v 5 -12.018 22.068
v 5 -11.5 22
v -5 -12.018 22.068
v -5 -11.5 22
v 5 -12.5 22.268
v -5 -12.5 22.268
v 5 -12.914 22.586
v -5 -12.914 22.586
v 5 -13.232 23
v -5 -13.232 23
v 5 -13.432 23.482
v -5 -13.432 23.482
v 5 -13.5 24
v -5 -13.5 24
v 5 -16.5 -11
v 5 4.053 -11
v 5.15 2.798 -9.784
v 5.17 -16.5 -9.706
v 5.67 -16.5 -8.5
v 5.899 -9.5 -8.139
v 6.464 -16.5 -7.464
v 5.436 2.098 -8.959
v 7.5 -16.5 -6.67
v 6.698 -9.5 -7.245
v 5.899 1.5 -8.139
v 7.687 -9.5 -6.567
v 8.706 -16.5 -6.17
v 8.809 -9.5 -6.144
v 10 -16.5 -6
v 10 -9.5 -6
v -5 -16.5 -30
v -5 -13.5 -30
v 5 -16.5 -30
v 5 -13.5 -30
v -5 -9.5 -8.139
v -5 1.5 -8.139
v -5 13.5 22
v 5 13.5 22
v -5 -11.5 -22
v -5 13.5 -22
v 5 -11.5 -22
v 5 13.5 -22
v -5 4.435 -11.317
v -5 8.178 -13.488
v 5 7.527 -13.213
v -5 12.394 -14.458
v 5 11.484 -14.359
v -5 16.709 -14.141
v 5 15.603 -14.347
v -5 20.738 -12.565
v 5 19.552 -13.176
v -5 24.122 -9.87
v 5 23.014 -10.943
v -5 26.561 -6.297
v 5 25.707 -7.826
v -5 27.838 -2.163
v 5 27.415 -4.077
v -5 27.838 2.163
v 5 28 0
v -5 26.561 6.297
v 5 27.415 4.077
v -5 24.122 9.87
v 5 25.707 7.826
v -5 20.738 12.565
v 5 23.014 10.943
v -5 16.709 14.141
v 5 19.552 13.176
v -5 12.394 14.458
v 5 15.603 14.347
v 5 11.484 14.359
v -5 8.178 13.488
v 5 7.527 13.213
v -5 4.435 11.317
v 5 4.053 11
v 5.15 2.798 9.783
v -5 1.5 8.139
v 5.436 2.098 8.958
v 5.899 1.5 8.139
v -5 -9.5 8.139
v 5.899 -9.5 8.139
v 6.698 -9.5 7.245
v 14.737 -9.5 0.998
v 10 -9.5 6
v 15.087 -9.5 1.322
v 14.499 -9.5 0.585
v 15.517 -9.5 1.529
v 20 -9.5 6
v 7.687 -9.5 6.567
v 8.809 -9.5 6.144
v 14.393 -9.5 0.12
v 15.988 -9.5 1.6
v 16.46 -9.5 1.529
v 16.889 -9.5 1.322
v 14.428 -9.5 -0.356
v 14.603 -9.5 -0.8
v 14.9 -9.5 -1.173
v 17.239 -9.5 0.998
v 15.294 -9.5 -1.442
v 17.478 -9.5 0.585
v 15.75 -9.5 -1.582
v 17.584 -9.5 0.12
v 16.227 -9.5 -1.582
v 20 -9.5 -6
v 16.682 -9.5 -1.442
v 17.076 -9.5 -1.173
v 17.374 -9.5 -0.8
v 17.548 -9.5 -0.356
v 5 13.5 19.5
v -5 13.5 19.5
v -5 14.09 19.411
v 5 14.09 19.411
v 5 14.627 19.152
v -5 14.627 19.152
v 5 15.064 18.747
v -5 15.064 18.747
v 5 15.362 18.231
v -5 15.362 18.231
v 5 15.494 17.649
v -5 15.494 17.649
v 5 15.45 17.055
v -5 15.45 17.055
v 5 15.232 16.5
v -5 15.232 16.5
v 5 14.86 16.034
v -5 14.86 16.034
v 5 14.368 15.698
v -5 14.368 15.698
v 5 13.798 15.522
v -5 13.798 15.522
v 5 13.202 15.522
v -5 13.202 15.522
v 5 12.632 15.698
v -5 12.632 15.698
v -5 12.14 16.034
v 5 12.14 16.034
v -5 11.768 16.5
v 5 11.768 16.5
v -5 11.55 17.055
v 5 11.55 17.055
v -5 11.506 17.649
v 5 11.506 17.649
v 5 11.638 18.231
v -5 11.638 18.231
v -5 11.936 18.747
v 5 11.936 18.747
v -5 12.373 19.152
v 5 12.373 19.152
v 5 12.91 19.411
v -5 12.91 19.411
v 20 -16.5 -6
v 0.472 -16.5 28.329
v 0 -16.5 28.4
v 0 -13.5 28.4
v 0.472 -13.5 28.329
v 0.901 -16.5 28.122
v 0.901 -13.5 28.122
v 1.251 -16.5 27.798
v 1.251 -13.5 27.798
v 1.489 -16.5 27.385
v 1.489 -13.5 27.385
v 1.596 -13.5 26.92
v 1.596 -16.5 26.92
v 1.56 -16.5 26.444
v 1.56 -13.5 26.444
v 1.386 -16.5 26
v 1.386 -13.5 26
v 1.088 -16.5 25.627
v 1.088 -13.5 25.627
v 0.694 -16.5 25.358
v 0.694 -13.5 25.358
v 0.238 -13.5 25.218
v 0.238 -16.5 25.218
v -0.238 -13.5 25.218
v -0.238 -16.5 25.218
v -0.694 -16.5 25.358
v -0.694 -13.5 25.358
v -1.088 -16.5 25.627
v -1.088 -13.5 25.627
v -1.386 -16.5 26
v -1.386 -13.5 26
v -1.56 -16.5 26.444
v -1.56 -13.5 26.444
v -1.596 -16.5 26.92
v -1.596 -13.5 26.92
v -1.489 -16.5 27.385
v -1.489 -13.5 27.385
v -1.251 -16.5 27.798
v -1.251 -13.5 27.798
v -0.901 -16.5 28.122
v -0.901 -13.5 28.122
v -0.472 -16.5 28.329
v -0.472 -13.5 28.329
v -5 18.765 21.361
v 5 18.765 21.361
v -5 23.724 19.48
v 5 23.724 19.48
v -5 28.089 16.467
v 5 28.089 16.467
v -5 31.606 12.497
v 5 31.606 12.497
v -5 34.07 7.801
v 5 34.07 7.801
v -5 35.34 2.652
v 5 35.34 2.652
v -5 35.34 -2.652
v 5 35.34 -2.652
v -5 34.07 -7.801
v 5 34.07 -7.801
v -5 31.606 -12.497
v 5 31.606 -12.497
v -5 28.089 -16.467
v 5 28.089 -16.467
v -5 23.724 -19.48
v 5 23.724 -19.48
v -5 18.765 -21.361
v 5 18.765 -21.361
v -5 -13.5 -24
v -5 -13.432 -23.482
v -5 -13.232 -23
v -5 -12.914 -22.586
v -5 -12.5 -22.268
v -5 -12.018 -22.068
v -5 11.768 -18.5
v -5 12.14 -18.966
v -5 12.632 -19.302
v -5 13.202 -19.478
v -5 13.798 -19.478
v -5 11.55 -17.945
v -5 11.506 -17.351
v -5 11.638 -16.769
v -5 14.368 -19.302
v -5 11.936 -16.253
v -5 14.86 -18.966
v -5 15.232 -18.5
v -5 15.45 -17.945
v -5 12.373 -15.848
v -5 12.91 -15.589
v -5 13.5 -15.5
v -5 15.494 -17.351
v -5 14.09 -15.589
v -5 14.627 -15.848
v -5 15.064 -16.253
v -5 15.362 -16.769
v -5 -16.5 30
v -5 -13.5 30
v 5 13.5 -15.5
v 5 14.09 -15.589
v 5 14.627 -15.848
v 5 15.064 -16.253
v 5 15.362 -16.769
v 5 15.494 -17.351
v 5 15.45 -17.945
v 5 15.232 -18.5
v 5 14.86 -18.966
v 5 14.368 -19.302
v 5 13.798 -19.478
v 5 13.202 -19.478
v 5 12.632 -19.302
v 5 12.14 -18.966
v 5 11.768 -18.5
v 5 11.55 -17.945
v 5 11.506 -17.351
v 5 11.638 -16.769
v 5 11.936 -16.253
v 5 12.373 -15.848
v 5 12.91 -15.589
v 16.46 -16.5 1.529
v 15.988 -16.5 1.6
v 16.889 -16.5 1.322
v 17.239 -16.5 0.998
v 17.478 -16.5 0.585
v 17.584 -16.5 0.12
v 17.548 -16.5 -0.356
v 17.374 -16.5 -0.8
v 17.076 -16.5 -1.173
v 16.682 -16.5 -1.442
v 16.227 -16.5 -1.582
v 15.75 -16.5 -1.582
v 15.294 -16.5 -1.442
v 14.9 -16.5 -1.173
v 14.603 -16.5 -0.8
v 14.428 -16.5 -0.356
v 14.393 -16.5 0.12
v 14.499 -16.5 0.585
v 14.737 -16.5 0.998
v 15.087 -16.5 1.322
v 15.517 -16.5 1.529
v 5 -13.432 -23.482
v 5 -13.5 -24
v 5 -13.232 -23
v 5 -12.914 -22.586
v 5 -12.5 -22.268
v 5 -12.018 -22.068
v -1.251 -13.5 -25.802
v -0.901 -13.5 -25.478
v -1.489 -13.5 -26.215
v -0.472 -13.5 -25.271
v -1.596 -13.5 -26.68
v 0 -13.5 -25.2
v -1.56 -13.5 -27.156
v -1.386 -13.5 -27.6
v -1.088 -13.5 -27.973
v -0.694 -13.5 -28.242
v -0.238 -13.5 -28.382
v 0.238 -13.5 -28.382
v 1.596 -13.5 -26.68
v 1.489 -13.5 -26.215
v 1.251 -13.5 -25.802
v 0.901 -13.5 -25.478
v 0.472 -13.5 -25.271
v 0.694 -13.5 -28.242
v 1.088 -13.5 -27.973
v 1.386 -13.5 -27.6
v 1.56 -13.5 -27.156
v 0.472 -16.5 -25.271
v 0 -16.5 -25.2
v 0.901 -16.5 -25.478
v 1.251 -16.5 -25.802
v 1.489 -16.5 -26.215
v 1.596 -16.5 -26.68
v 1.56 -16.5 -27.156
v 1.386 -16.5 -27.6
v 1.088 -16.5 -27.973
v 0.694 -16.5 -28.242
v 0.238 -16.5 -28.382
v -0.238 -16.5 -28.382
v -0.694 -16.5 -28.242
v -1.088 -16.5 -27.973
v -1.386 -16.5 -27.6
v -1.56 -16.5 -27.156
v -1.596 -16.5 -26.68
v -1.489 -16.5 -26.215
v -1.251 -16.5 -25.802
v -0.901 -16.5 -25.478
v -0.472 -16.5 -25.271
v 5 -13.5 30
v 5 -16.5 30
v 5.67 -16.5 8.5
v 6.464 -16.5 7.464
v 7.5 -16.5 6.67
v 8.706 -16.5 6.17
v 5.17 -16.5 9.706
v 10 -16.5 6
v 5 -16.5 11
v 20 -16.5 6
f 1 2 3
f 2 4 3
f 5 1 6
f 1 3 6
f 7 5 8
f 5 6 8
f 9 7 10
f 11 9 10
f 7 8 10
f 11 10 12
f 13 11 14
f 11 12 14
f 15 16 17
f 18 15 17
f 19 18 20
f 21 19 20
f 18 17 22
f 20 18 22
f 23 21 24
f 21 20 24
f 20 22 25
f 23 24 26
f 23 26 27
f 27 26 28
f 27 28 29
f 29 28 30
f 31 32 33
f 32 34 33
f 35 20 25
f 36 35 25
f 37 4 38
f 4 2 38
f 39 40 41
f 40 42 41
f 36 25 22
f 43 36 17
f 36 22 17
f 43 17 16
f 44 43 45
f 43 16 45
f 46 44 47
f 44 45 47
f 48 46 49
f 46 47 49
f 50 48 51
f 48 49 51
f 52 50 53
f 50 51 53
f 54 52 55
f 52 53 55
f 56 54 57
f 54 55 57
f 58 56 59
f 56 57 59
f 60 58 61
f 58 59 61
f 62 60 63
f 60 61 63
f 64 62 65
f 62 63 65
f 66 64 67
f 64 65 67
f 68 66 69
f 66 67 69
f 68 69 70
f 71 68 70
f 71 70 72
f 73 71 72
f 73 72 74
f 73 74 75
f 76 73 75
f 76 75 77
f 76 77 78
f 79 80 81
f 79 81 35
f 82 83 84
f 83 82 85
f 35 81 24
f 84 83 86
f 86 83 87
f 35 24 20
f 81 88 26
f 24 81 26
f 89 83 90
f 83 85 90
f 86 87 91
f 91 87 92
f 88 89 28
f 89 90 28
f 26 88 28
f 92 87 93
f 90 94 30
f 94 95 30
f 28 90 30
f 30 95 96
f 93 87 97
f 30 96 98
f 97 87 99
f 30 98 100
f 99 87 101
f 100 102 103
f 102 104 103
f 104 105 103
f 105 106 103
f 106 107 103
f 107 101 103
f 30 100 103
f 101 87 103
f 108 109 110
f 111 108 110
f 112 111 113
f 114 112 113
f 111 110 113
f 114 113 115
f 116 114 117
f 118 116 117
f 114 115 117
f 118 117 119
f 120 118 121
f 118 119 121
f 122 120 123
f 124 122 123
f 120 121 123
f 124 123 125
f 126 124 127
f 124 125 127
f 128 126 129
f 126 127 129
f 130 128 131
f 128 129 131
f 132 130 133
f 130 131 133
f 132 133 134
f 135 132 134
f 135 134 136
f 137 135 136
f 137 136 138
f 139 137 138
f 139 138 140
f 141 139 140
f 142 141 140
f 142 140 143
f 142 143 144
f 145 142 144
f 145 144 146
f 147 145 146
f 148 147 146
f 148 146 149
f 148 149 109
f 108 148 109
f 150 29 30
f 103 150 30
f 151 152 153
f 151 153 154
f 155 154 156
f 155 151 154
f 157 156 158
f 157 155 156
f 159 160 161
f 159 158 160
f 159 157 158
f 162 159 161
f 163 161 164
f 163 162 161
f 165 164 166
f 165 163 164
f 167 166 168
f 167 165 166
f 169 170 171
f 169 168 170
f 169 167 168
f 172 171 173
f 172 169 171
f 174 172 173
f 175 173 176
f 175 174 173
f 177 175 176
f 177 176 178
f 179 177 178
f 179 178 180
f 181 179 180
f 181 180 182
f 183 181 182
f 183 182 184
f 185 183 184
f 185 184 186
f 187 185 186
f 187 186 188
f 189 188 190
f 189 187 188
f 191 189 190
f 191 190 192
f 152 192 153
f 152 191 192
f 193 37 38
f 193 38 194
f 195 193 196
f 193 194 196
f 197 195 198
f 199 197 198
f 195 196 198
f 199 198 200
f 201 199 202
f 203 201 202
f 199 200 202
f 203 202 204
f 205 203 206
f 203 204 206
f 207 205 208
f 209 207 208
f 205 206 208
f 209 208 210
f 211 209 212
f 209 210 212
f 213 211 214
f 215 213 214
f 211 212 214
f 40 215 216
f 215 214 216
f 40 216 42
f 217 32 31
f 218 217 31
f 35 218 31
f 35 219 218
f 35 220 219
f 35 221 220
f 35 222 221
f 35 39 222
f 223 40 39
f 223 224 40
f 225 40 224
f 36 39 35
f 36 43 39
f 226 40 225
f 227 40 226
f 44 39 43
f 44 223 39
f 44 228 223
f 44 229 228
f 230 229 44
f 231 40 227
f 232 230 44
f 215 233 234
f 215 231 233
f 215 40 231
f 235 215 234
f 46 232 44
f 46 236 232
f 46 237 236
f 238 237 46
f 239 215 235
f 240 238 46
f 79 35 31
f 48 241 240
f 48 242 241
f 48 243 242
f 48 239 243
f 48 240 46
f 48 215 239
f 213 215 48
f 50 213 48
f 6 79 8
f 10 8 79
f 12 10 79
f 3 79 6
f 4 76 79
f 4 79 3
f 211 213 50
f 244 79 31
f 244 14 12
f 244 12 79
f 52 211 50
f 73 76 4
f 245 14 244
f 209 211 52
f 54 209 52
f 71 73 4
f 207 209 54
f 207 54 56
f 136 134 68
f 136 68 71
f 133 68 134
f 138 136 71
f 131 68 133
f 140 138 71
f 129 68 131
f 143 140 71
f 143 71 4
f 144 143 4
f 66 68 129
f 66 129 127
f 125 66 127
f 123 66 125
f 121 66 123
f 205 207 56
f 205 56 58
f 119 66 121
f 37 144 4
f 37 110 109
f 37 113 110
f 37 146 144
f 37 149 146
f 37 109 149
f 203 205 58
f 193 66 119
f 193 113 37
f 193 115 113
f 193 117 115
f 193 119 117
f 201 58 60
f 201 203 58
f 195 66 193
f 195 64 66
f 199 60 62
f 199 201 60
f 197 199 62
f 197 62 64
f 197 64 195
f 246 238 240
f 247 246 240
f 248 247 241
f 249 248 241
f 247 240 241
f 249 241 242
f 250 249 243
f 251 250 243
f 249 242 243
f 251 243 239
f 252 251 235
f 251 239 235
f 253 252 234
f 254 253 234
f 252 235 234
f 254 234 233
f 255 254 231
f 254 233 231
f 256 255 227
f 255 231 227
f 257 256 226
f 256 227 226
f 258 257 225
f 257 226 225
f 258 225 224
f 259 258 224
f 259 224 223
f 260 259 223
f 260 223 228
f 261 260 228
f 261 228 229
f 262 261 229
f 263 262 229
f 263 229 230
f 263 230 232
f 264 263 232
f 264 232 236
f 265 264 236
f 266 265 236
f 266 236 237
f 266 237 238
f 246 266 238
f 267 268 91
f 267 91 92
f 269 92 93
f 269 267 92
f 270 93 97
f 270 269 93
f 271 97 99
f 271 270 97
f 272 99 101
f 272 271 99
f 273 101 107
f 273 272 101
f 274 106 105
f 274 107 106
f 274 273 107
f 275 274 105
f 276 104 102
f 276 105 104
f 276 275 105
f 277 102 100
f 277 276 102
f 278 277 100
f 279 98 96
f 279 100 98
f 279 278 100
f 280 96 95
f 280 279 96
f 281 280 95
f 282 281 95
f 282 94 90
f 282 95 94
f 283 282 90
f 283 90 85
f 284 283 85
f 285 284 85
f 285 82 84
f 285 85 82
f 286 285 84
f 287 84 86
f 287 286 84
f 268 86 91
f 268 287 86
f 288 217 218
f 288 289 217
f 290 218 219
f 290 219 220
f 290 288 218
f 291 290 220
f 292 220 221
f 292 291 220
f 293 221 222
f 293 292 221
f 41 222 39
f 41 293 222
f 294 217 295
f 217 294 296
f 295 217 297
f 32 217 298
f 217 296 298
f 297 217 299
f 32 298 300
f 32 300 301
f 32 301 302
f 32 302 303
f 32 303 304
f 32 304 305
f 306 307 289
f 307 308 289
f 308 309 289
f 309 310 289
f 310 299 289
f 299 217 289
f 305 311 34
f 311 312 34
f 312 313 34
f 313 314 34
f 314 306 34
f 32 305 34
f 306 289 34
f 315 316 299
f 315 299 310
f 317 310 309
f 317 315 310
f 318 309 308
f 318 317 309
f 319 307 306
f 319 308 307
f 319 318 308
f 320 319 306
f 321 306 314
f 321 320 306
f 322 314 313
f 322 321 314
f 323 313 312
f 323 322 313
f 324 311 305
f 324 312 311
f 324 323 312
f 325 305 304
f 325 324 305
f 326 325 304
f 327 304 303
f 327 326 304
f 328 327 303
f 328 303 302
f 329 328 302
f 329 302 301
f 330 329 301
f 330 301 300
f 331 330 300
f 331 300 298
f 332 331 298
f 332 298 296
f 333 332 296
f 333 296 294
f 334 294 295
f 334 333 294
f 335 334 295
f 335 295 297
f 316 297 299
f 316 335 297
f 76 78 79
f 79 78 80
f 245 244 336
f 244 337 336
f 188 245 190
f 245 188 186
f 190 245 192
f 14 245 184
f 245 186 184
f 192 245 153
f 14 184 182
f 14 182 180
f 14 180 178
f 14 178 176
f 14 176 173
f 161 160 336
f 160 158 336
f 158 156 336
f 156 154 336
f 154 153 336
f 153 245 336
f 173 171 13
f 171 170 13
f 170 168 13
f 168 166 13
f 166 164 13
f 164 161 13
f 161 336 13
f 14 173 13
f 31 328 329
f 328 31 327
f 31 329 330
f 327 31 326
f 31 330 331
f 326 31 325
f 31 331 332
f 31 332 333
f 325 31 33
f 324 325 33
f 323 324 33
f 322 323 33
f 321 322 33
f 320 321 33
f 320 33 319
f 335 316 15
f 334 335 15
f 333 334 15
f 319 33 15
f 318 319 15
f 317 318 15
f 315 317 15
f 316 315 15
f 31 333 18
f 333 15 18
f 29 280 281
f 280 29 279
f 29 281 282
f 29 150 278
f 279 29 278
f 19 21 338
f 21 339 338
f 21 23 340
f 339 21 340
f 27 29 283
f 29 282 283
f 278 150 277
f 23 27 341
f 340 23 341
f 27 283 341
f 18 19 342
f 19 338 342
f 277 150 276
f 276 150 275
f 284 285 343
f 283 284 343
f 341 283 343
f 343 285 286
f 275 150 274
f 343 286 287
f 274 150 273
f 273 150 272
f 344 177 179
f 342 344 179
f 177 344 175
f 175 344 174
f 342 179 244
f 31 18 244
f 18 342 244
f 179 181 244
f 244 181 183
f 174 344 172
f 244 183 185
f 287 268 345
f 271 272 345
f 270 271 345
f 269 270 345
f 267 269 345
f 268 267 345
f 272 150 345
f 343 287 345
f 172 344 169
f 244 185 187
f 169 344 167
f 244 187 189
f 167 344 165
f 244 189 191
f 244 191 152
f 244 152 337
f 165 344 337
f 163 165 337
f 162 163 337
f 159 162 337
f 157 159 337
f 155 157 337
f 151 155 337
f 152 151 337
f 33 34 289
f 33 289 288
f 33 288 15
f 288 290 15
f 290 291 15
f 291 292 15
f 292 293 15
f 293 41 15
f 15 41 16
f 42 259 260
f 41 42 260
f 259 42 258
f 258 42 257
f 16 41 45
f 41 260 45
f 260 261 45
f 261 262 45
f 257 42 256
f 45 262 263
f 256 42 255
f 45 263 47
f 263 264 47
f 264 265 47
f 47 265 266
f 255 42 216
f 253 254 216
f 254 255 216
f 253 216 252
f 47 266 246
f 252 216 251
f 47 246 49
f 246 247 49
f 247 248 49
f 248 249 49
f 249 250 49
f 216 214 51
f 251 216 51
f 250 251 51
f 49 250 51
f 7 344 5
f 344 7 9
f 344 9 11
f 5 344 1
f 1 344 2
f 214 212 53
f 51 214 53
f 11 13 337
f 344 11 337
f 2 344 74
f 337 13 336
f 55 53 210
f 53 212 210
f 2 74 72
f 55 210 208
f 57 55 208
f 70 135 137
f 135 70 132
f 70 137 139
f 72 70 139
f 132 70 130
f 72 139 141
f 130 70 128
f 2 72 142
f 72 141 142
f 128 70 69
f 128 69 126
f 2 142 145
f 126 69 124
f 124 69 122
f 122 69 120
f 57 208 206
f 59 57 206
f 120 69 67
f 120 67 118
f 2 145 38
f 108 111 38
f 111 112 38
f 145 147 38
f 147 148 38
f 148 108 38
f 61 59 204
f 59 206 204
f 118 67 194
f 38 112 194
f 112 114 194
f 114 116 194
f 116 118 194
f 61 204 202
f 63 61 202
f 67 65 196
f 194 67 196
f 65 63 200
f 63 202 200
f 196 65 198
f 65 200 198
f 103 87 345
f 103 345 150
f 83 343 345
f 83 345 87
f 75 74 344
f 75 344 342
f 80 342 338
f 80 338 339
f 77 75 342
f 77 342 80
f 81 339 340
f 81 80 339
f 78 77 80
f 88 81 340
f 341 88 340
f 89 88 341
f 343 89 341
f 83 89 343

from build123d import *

# Parameters (mm, degrees)
BOSS_EXTRUDE1_DEPTH     = 5
CUT_EXTRUDE1_DEPTH      = 48.542086618
SKETCH3_R               = 2
CUT_EXTRUDE2_DEPTH      = 48.542086618
FILLET1_R               = 2
SKETCH5_W               = 12
SKETCH5_H               = 7
BOSS_EXTRUDE2_DEPTH     = 15
CUT_EXTRUDE3_DEPTH      = 61.835844697
CUT_EXTRUDE3_DEPTH_BACK = 61.835844697
SKETCH4_R               = 1.6
FILLET2_R               = 5


with BuildPart() as part:
    # Sketch1 → Boss-Extrude1 (new, symmetric)
    with BuildSketch(Plane(origin=(0, 0, 0), x_dir=(0, 0, -1), z_dir=(1, 0, 0))):
        with BuildLine():
            Line((22, -13.5), (30, -13.5))
            Line((30, -13.5), (30, -16.5))
            Line((30, -16.5), (-30, -16.5))
            Line((-30, -16.5), (-30, -13.5))
            Line((-30, -13.5), (-22, -13.5))
            Line((-22, -13.5), (-22, 13.5))
            ThreePointArc((-22, 13.5), (0, 35.5), (22, 13.5))
            Line((22, 13.5), (22, -13.5))
        make_face()
    extrude(amount=BOSS_EXTRUDE1_DEPTH, both=True)

    # Sketch2 → Cut-Extrude1 (cut, through all)
    with BuildSketch(Plane(origin=(5, 0, 0), x_dir=(0, 0, -1), z_dir=(1, 0, 0))):
        with BuildLine():
            Line((-8.139410298, 1.5), (-8.139410298, -9.5))
            Line((-8.139410298, -9.5), (8.139410298, -9.5))
            Line((8.139410298, -9.5), (8.139410298, 1.5))
            ThreePointArc((8.139410298, 1.5), (0, 28), (-8.139410298, 1.5))
        make_face()
    extrude(amount=-CUT_EXTRUDE1_DEPTH, mode=Mode.SUBTRACT)

    # Sketch3 → Cut-Extrude2 (cut, through all)
    with BuildSketch(Plane.ZY.offset(5)):
        with Locations((17.5, 13.5)):
            Circle(SKETCH3_R)
        with Locations((-17.5, 13.5)):
            Circle(SKETCH3_R)
    extrude(amount=-CUT_EXTRUDE2_DEPTH, mode=Mode.SUBTRACT)

    # Fillet1
    fillet1_edges = [part.edges().sort_by_distance(p)[0] for p in [
        (0, -13.5, -22),
        (0, -13.5, 22),
    ]]
    fillet(fillet1_edges, radius=FILLET1_R)

    # Sketch5 → Boss-Extrude2 (add)
    with BuildSketch(Plane(origin=(5, 0, 0), x_dir=(0, 0, -1), z_dir=(1, 0, 0))):
        with Locations((0, -13)):
            Rectangle(SKETCH5_W, SKETCH5_H)
    extrude(amount=BOSS_EXTRUDE2_DEPTH)

    # Sketch4 → Cut-Extrude3 (cut, two sides: drawn at the far end of the back side and taken through both)
    with BuildSketch(Plane(origin=(0, -13.5, 0), x_dir=(1, 0, 0), z_dir=(0, 1, 0)).offset(-CUT_EXTRUDE3_DEPTH_BACK)):
        with Locations(Location((0, 26.8, 0), (0, 0, 270))):
            Circle(SKETCH4_R)
        with Locations(Location((0, -26.8, 0), (0, 0, 270))):
            Circle(SKETCH4_R)
        with Locations(Location((15.988182788, 0, 0), (0, 0, 270))):
            Circle(SKETCH4_R)
    extrude(amount=CUT_EXTRUDE3_DEPTH + CUT_EXTRUDE3_DEPTH_BACK, mode=Mode.SUBTRACT)

    # Fillet2
    fillet2_edges = [part.edges().sort_by_distance(p)[0] for p in [
        (5, -13, -6),
        (5, -13, 6),
    ]]
    fillet(fillet2_edges, radius=FILLET2_R)


solid = part.part
